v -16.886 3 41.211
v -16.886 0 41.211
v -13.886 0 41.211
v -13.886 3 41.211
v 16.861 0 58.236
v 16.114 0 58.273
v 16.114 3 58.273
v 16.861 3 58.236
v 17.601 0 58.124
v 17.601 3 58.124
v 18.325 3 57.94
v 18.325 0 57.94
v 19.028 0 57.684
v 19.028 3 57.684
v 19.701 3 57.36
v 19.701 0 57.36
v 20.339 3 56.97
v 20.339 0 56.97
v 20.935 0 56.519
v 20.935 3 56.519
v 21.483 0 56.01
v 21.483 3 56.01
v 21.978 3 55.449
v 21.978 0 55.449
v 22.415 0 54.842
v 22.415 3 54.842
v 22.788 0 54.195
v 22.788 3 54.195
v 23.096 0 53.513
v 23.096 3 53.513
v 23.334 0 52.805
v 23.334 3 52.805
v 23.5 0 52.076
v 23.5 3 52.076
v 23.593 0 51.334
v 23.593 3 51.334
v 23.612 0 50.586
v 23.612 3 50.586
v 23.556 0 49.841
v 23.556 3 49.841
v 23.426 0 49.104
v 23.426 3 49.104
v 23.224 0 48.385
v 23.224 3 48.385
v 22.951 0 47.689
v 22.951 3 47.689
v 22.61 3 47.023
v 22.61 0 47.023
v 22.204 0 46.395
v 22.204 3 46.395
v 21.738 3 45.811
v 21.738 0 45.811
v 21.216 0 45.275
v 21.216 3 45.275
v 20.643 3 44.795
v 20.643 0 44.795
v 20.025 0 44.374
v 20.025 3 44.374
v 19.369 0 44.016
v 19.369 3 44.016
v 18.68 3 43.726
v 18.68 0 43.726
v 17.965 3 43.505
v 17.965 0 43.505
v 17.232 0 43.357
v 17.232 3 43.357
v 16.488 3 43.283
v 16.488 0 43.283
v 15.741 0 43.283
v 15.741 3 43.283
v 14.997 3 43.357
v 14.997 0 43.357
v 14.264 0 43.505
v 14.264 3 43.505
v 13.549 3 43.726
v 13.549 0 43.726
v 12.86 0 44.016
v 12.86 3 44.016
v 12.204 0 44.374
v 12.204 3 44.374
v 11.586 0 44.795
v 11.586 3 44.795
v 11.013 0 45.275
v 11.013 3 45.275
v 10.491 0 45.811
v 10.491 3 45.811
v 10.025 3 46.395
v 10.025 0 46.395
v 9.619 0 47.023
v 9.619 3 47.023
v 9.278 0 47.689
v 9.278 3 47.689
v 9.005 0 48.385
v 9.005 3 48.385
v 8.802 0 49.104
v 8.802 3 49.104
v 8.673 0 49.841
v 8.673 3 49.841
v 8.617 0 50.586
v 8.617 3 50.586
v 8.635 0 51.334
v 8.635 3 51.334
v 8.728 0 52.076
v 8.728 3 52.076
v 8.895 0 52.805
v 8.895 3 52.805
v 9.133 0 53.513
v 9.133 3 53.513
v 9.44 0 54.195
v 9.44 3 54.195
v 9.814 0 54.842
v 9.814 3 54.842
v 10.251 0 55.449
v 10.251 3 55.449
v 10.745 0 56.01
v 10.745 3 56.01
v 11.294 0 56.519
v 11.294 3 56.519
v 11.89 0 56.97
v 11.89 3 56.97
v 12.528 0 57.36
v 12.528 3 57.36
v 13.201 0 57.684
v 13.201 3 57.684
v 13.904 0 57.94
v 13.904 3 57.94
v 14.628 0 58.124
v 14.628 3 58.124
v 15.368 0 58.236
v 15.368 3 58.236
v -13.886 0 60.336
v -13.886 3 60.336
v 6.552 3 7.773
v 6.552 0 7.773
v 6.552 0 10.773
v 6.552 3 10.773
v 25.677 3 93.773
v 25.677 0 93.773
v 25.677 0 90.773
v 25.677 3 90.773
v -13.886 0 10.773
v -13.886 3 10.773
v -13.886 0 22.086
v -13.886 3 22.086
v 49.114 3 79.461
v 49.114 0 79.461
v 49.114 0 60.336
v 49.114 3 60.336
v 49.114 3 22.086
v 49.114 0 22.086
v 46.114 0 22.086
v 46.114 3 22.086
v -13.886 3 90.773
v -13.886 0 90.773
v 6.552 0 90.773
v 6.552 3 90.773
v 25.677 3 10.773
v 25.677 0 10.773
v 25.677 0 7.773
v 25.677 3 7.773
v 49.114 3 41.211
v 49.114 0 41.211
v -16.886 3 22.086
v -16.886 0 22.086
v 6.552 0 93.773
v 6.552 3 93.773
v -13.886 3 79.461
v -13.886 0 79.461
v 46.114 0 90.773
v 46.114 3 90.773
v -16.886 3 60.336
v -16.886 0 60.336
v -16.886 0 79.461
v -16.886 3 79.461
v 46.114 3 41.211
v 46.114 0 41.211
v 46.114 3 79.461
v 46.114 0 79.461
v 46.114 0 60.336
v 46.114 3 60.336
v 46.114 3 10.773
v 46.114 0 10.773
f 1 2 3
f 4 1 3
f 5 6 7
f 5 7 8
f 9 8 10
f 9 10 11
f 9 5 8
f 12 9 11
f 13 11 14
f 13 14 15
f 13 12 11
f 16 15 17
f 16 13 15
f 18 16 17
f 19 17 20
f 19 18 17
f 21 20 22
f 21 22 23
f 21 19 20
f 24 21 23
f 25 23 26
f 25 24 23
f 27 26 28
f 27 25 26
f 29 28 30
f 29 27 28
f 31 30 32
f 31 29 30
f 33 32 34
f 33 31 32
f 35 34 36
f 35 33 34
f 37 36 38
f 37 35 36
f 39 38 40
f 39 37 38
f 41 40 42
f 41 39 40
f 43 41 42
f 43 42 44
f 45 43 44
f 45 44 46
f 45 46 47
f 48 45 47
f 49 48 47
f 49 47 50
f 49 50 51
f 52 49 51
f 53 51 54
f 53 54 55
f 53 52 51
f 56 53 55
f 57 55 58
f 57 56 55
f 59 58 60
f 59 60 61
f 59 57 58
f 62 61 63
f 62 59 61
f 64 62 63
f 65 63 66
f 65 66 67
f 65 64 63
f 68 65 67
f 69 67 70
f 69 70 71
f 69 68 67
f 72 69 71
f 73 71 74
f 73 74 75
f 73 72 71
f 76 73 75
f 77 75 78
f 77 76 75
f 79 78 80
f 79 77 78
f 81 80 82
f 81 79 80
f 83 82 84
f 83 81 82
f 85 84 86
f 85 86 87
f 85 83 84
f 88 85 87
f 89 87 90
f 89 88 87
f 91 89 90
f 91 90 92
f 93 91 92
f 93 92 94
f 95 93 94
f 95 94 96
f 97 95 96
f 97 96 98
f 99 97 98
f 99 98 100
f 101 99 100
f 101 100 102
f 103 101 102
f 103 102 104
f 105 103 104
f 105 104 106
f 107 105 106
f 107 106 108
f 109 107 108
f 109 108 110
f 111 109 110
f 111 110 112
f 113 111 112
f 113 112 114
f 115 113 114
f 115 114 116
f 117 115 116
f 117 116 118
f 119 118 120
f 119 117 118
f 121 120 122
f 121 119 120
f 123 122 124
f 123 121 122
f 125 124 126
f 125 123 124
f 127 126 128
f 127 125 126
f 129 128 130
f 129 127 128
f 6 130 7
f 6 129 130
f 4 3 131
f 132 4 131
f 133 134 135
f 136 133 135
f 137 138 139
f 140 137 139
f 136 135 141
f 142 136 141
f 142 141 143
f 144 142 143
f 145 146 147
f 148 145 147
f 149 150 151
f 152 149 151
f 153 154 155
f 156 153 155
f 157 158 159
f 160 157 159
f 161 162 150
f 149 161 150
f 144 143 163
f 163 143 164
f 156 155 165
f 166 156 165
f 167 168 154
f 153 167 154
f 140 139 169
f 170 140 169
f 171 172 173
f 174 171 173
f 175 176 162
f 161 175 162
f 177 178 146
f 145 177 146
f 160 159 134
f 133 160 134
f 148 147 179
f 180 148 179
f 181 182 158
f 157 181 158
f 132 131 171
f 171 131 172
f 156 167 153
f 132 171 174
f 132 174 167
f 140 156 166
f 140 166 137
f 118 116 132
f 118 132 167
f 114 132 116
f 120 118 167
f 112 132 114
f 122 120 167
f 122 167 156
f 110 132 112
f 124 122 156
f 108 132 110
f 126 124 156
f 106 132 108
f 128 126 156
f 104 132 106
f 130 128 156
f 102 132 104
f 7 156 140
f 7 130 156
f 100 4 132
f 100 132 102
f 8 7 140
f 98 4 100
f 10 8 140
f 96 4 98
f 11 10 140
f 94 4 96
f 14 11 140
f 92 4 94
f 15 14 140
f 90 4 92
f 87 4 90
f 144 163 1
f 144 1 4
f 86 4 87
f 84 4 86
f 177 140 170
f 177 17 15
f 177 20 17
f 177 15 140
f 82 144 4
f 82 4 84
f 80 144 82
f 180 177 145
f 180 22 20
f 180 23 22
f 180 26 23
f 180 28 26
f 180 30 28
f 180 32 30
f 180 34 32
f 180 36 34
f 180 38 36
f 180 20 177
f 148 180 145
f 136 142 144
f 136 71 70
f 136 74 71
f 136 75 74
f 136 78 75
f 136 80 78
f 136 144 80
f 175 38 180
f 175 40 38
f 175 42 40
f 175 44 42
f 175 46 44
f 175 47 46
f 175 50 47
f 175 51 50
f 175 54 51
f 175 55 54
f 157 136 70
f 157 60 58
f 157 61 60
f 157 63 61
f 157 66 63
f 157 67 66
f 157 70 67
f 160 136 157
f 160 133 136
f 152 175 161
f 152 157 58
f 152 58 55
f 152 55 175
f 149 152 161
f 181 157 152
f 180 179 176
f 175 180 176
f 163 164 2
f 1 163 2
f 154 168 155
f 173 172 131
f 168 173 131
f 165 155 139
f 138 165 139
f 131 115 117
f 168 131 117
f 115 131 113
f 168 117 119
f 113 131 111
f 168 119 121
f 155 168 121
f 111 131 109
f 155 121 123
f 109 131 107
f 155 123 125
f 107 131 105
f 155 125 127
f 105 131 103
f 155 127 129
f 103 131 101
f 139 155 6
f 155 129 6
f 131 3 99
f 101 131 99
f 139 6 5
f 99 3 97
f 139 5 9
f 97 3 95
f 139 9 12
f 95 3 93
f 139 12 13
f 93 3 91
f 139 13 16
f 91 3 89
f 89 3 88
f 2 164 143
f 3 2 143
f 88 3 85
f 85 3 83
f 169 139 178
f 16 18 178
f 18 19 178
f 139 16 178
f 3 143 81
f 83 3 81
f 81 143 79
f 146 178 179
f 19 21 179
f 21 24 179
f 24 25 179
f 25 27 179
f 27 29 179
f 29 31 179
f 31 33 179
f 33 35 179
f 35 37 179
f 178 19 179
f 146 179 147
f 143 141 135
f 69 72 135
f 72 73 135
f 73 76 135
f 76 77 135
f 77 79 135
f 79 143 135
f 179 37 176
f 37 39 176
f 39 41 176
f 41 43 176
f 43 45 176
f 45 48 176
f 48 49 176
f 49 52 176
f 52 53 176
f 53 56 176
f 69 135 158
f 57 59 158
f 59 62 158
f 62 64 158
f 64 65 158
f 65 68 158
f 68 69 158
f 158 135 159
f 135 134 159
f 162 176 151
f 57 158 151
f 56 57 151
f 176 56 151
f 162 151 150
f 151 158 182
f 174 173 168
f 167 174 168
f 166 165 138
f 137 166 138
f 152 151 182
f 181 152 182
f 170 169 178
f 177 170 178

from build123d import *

# Parameters (mm, degrees)
SKETCH1_R           = 7.5
BOSS_EXTRUDE1_DEPTH = 3


with BuildPart() as part:
    # Sketch1 → Boss-Extrude1 (new body)
    with BuildSketch(Plane(origin=(0, 0, 0), x_dir=(1, 0, 0), z_dir=(0, 1, 0))):
        Polygon((-13.885581934, -10.773206129), (-13.885581934, -22.085706129), (-16.885581934, -22.085706129), (-16.885581934, -41.210706129), (-13.885581934, -41.210706129), (-13.885581934, -60.335706129), (-16.885581934, -60.335706129), (-16.885581934, -79.460706129), (-13.885581934, -79.460706129), (-13.885581934, -90.773206129), (6.551918066, -90.773206129), (6.551918066, -93.773206129), (25.676918066, -93.773206129), (25.676918066, -90.773206129), (44.801918066, -90.773206129), (46.114418066, -90.773206129), (46.114418066, -79.460706129), (49.114418066, -79.460706129), (49.114418066, -60.335706129), (46.114418066, -60.335706129), (46.114418066, -41.210706129), (49.114418066, -41.210706129), (49.114418066, -22.085706129), (46.114418066, -22.085706129), (46.114418066, -10.773206129), (25.676918066, -10.773206129), (25.676918066, -7.773206129), (6.551918066, -7.773206129), (6.551918066, -10.773206129), (-12.573081934, -10.773206129), align=None)
        with Locations(Location((16.114418066, -50.773206129, 0), (0, 0, 270))):
            Circle(SKETCH1_R, mode=Mode.SUBTRACT)
    extrude(amount=BOSS_EXTRUDE1_DEPTH)


solid = part.part
